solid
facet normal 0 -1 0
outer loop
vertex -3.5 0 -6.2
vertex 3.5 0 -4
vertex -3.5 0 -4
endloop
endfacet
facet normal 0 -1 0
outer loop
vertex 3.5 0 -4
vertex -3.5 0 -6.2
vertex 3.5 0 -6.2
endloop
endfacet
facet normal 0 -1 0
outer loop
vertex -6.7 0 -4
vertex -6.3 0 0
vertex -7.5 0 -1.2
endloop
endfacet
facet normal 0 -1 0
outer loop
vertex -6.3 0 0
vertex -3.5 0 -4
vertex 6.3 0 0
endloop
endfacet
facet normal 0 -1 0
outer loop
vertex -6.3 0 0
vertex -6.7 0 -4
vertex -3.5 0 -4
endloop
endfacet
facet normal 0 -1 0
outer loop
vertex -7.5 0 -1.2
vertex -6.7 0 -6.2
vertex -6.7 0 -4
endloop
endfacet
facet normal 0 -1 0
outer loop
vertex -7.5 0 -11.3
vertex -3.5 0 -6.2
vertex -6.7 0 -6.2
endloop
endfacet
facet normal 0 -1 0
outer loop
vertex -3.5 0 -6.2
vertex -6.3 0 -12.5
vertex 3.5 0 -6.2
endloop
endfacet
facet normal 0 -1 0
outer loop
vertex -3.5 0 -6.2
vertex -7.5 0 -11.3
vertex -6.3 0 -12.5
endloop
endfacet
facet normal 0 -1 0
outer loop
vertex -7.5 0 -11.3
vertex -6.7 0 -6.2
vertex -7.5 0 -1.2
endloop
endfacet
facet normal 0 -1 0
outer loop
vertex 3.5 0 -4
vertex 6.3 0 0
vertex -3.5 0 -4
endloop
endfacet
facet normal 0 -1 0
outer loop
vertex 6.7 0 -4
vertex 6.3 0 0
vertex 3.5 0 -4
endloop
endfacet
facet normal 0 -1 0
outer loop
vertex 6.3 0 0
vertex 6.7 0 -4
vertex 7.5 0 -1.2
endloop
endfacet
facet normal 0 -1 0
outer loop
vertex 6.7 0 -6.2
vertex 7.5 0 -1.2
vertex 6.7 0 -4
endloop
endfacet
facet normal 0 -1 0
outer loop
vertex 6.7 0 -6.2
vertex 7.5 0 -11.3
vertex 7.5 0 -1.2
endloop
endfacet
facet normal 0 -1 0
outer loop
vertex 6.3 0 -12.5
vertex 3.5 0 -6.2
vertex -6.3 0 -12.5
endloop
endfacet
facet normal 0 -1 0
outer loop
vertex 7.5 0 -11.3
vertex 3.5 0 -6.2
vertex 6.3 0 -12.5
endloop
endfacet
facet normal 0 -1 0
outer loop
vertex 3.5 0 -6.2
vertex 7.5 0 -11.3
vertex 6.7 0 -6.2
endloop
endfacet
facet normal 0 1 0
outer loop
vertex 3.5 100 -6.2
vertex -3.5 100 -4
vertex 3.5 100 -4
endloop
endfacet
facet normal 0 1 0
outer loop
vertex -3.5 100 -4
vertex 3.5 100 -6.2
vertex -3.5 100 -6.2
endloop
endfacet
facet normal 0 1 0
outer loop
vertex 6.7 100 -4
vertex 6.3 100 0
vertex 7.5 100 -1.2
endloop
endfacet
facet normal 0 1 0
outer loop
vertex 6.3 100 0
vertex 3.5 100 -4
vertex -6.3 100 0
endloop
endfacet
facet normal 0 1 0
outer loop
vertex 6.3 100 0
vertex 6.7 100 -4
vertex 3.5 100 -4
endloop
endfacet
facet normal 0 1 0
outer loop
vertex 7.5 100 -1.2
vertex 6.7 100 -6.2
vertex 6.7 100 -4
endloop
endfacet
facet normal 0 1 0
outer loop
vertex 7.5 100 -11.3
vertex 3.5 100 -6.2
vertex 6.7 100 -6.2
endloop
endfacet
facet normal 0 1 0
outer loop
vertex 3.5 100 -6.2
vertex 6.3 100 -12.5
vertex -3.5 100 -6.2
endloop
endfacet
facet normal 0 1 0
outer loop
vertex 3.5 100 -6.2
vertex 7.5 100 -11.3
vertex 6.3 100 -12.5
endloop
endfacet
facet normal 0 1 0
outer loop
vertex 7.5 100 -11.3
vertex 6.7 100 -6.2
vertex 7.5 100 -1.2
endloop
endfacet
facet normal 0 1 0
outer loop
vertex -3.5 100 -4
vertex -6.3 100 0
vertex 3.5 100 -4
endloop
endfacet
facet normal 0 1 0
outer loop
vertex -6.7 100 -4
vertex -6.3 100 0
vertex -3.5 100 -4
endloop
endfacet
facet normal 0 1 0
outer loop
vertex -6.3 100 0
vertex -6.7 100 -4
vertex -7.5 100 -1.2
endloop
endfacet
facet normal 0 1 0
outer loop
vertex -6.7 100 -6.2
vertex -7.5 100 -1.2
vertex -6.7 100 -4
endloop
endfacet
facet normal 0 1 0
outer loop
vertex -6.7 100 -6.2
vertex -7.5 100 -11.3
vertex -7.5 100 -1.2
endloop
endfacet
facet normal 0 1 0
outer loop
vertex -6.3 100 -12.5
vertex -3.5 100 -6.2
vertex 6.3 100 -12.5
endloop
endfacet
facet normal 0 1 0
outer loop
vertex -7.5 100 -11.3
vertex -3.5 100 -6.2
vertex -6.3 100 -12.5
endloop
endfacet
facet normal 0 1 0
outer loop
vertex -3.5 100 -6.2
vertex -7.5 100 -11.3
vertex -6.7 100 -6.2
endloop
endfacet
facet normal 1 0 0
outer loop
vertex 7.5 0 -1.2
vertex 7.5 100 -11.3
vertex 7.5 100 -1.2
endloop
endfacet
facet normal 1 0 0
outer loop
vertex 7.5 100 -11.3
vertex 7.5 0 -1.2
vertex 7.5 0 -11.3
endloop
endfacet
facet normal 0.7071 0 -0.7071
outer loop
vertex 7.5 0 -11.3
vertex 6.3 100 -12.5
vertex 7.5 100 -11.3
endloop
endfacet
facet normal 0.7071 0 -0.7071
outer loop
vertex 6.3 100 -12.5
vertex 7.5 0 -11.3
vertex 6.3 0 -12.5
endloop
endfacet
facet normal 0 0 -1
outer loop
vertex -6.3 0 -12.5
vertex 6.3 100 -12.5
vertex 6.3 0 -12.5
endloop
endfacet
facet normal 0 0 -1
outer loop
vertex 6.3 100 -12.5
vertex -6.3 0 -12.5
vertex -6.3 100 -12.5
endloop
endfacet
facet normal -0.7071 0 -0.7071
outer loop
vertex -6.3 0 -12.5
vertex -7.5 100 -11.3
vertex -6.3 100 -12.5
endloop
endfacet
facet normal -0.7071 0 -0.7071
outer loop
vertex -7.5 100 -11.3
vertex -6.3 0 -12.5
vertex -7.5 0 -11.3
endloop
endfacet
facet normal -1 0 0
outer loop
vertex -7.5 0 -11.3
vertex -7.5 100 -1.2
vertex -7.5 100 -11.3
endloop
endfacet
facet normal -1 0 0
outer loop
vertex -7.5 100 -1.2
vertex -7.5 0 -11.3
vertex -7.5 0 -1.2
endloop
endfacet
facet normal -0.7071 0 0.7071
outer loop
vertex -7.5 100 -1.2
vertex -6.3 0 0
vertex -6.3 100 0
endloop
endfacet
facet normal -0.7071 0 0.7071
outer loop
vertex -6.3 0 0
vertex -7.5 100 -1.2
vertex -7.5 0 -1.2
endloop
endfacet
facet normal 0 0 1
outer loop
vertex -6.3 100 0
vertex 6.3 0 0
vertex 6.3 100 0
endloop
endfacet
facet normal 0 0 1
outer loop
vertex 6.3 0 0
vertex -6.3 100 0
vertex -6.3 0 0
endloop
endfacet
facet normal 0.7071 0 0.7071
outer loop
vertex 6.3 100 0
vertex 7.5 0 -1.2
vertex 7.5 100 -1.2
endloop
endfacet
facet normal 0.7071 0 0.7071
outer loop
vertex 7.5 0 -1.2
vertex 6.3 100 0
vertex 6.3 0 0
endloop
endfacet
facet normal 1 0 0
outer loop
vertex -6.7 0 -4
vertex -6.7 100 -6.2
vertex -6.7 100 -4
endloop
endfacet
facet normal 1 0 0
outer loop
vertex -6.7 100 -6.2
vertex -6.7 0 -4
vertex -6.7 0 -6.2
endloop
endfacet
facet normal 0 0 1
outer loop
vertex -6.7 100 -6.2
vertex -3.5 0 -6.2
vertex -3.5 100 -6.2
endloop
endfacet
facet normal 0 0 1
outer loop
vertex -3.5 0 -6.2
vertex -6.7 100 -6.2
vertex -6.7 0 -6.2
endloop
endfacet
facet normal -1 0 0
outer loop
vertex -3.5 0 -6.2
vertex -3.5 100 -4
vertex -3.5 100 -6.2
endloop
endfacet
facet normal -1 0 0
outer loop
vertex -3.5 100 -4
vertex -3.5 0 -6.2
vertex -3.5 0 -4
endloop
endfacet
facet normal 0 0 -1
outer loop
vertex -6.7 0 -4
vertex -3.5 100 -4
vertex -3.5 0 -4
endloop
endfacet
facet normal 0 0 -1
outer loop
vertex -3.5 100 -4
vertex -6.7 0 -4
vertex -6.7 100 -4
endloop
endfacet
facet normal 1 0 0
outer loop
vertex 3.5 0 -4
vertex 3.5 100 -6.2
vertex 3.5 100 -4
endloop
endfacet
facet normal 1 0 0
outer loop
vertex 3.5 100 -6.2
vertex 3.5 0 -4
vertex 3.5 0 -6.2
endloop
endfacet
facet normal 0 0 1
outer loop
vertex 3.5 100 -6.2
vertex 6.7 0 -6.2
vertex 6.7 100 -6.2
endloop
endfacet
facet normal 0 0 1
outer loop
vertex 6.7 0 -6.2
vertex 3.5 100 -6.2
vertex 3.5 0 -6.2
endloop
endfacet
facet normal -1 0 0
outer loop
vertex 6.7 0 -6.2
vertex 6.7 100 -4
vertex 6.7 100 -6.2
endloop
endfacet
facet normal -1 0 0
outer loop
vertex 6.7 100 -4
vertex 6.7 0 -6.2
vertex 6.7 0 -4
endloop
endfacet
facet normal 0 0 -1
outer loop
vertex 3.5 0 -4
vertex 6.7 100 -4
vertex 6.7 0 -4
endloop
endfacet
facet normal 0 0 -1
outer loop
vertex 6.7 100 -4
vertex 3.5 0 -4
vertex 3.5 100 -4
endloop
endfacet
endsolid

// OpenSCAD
$fn = 64;

// Miniature linear guide rail
// Overall: 15.0mm wide (X), 12.5mm tall (Z), 100mm long (Y)

rail_w = 15.0;
rail_h = 12.5;
rail_l = 100.0;

// Profile details (approximate, stylized)
top_w = 9.0;          // top land width
top_h = 2.0;          // top land height
side_chamfer = 1.2;   // outer edge chamfer size
groove_w = 3.2;       // side groove width
groove_h = 2.2;       // side groove height
groove_z = 6.2;       // groove center height from bottom

// Mounting holes (stylized)
hole_d = 3.4;
csk_d  = 6.2;
csk_h  = 1.6;
end_margin = 10.0;
hole_pitch = 20.0;

module rail_profile_2d() {
    // Build a chamfered rectangle with a slightly raised top land
    // Base outline with chamfers
    difference() {
        union() {
            // Main body with chamfers via offset trick
            offset(delta = 0)
            polygon(points=[
                [ -rail_w/2 + side_chamfer, 0 ],
                [  rail_w/2 - side_chamfer, 0 ],
                [  rail_w/2, side_chamfer ],
                [  rail_w/2, rail_h - side_chamfer ],
                [  rail_w/2 - side_chamfer, rail_h ],
                [ -rail_w/2 + side_chamfer, rail_h ],
                [ -rail_w/2, rail_h - side_chamfer ],
                [ -rail_w/2, side_chamfer ]
            ]);

            // Slight top land (centered)
            translate([0, rail_h - top_h])
                square([top_w, top_h], center=true);
        }

        // Side grooves (left and right)
        for (sx = [-1, 1]) {
            translate([sx*(rail_w/2 - groove_w/2 - 0.8), groove_z - groove_h/2])
                square([groove_w, groove_h], center=true);
        }
    }
}

module rail_body() {
    linear_extrude(height = rail_l, center = false, convexity = 10)
        rail_profile_2d();
}

module mounting_holes() {
    // Through holes along length (Y axis), centered in X, drilled from top
    // Place holes from end_margin to rail_l - end_margin at hole_pitch
    for (y = [end_margin : hole_pitch : rail_l - end_margin + 0.001]) {
        // Through hole
        translate([0, y, rail_h/2])
            rotate([90,0,0])
                cylinder(d=hole_d, h=rail_h+2, center=true);

        // Counterbore/countersink from top (simple conical)
        translate([0, y, rail_h - csk_h/2])
            rotate([90,0,0])
                cylinder(d1=csk_d, d2=hole_d, h=csk_h, center=true);
    }
}

difference() {
    // Orient: length along Y, width along X, height along Z
    // rail_body extrudes along Y from 0..rail_l; profile is in X-Z plane
    // So we rotate profile extrusion to align Z as vertical:
    // Our profile is defined in X (horizontal) and Z (vertical) already,
    // but linear_extrude uses Z as extrusion axis. We'll instead extrude along Y by rotating.
    rotate([-90,0,0])  // move extrusion axis from Z to Y
        rail_body();

    // Subtract mounting holes (already aligned with Y length and Z height)
    mounting_holes();
}
